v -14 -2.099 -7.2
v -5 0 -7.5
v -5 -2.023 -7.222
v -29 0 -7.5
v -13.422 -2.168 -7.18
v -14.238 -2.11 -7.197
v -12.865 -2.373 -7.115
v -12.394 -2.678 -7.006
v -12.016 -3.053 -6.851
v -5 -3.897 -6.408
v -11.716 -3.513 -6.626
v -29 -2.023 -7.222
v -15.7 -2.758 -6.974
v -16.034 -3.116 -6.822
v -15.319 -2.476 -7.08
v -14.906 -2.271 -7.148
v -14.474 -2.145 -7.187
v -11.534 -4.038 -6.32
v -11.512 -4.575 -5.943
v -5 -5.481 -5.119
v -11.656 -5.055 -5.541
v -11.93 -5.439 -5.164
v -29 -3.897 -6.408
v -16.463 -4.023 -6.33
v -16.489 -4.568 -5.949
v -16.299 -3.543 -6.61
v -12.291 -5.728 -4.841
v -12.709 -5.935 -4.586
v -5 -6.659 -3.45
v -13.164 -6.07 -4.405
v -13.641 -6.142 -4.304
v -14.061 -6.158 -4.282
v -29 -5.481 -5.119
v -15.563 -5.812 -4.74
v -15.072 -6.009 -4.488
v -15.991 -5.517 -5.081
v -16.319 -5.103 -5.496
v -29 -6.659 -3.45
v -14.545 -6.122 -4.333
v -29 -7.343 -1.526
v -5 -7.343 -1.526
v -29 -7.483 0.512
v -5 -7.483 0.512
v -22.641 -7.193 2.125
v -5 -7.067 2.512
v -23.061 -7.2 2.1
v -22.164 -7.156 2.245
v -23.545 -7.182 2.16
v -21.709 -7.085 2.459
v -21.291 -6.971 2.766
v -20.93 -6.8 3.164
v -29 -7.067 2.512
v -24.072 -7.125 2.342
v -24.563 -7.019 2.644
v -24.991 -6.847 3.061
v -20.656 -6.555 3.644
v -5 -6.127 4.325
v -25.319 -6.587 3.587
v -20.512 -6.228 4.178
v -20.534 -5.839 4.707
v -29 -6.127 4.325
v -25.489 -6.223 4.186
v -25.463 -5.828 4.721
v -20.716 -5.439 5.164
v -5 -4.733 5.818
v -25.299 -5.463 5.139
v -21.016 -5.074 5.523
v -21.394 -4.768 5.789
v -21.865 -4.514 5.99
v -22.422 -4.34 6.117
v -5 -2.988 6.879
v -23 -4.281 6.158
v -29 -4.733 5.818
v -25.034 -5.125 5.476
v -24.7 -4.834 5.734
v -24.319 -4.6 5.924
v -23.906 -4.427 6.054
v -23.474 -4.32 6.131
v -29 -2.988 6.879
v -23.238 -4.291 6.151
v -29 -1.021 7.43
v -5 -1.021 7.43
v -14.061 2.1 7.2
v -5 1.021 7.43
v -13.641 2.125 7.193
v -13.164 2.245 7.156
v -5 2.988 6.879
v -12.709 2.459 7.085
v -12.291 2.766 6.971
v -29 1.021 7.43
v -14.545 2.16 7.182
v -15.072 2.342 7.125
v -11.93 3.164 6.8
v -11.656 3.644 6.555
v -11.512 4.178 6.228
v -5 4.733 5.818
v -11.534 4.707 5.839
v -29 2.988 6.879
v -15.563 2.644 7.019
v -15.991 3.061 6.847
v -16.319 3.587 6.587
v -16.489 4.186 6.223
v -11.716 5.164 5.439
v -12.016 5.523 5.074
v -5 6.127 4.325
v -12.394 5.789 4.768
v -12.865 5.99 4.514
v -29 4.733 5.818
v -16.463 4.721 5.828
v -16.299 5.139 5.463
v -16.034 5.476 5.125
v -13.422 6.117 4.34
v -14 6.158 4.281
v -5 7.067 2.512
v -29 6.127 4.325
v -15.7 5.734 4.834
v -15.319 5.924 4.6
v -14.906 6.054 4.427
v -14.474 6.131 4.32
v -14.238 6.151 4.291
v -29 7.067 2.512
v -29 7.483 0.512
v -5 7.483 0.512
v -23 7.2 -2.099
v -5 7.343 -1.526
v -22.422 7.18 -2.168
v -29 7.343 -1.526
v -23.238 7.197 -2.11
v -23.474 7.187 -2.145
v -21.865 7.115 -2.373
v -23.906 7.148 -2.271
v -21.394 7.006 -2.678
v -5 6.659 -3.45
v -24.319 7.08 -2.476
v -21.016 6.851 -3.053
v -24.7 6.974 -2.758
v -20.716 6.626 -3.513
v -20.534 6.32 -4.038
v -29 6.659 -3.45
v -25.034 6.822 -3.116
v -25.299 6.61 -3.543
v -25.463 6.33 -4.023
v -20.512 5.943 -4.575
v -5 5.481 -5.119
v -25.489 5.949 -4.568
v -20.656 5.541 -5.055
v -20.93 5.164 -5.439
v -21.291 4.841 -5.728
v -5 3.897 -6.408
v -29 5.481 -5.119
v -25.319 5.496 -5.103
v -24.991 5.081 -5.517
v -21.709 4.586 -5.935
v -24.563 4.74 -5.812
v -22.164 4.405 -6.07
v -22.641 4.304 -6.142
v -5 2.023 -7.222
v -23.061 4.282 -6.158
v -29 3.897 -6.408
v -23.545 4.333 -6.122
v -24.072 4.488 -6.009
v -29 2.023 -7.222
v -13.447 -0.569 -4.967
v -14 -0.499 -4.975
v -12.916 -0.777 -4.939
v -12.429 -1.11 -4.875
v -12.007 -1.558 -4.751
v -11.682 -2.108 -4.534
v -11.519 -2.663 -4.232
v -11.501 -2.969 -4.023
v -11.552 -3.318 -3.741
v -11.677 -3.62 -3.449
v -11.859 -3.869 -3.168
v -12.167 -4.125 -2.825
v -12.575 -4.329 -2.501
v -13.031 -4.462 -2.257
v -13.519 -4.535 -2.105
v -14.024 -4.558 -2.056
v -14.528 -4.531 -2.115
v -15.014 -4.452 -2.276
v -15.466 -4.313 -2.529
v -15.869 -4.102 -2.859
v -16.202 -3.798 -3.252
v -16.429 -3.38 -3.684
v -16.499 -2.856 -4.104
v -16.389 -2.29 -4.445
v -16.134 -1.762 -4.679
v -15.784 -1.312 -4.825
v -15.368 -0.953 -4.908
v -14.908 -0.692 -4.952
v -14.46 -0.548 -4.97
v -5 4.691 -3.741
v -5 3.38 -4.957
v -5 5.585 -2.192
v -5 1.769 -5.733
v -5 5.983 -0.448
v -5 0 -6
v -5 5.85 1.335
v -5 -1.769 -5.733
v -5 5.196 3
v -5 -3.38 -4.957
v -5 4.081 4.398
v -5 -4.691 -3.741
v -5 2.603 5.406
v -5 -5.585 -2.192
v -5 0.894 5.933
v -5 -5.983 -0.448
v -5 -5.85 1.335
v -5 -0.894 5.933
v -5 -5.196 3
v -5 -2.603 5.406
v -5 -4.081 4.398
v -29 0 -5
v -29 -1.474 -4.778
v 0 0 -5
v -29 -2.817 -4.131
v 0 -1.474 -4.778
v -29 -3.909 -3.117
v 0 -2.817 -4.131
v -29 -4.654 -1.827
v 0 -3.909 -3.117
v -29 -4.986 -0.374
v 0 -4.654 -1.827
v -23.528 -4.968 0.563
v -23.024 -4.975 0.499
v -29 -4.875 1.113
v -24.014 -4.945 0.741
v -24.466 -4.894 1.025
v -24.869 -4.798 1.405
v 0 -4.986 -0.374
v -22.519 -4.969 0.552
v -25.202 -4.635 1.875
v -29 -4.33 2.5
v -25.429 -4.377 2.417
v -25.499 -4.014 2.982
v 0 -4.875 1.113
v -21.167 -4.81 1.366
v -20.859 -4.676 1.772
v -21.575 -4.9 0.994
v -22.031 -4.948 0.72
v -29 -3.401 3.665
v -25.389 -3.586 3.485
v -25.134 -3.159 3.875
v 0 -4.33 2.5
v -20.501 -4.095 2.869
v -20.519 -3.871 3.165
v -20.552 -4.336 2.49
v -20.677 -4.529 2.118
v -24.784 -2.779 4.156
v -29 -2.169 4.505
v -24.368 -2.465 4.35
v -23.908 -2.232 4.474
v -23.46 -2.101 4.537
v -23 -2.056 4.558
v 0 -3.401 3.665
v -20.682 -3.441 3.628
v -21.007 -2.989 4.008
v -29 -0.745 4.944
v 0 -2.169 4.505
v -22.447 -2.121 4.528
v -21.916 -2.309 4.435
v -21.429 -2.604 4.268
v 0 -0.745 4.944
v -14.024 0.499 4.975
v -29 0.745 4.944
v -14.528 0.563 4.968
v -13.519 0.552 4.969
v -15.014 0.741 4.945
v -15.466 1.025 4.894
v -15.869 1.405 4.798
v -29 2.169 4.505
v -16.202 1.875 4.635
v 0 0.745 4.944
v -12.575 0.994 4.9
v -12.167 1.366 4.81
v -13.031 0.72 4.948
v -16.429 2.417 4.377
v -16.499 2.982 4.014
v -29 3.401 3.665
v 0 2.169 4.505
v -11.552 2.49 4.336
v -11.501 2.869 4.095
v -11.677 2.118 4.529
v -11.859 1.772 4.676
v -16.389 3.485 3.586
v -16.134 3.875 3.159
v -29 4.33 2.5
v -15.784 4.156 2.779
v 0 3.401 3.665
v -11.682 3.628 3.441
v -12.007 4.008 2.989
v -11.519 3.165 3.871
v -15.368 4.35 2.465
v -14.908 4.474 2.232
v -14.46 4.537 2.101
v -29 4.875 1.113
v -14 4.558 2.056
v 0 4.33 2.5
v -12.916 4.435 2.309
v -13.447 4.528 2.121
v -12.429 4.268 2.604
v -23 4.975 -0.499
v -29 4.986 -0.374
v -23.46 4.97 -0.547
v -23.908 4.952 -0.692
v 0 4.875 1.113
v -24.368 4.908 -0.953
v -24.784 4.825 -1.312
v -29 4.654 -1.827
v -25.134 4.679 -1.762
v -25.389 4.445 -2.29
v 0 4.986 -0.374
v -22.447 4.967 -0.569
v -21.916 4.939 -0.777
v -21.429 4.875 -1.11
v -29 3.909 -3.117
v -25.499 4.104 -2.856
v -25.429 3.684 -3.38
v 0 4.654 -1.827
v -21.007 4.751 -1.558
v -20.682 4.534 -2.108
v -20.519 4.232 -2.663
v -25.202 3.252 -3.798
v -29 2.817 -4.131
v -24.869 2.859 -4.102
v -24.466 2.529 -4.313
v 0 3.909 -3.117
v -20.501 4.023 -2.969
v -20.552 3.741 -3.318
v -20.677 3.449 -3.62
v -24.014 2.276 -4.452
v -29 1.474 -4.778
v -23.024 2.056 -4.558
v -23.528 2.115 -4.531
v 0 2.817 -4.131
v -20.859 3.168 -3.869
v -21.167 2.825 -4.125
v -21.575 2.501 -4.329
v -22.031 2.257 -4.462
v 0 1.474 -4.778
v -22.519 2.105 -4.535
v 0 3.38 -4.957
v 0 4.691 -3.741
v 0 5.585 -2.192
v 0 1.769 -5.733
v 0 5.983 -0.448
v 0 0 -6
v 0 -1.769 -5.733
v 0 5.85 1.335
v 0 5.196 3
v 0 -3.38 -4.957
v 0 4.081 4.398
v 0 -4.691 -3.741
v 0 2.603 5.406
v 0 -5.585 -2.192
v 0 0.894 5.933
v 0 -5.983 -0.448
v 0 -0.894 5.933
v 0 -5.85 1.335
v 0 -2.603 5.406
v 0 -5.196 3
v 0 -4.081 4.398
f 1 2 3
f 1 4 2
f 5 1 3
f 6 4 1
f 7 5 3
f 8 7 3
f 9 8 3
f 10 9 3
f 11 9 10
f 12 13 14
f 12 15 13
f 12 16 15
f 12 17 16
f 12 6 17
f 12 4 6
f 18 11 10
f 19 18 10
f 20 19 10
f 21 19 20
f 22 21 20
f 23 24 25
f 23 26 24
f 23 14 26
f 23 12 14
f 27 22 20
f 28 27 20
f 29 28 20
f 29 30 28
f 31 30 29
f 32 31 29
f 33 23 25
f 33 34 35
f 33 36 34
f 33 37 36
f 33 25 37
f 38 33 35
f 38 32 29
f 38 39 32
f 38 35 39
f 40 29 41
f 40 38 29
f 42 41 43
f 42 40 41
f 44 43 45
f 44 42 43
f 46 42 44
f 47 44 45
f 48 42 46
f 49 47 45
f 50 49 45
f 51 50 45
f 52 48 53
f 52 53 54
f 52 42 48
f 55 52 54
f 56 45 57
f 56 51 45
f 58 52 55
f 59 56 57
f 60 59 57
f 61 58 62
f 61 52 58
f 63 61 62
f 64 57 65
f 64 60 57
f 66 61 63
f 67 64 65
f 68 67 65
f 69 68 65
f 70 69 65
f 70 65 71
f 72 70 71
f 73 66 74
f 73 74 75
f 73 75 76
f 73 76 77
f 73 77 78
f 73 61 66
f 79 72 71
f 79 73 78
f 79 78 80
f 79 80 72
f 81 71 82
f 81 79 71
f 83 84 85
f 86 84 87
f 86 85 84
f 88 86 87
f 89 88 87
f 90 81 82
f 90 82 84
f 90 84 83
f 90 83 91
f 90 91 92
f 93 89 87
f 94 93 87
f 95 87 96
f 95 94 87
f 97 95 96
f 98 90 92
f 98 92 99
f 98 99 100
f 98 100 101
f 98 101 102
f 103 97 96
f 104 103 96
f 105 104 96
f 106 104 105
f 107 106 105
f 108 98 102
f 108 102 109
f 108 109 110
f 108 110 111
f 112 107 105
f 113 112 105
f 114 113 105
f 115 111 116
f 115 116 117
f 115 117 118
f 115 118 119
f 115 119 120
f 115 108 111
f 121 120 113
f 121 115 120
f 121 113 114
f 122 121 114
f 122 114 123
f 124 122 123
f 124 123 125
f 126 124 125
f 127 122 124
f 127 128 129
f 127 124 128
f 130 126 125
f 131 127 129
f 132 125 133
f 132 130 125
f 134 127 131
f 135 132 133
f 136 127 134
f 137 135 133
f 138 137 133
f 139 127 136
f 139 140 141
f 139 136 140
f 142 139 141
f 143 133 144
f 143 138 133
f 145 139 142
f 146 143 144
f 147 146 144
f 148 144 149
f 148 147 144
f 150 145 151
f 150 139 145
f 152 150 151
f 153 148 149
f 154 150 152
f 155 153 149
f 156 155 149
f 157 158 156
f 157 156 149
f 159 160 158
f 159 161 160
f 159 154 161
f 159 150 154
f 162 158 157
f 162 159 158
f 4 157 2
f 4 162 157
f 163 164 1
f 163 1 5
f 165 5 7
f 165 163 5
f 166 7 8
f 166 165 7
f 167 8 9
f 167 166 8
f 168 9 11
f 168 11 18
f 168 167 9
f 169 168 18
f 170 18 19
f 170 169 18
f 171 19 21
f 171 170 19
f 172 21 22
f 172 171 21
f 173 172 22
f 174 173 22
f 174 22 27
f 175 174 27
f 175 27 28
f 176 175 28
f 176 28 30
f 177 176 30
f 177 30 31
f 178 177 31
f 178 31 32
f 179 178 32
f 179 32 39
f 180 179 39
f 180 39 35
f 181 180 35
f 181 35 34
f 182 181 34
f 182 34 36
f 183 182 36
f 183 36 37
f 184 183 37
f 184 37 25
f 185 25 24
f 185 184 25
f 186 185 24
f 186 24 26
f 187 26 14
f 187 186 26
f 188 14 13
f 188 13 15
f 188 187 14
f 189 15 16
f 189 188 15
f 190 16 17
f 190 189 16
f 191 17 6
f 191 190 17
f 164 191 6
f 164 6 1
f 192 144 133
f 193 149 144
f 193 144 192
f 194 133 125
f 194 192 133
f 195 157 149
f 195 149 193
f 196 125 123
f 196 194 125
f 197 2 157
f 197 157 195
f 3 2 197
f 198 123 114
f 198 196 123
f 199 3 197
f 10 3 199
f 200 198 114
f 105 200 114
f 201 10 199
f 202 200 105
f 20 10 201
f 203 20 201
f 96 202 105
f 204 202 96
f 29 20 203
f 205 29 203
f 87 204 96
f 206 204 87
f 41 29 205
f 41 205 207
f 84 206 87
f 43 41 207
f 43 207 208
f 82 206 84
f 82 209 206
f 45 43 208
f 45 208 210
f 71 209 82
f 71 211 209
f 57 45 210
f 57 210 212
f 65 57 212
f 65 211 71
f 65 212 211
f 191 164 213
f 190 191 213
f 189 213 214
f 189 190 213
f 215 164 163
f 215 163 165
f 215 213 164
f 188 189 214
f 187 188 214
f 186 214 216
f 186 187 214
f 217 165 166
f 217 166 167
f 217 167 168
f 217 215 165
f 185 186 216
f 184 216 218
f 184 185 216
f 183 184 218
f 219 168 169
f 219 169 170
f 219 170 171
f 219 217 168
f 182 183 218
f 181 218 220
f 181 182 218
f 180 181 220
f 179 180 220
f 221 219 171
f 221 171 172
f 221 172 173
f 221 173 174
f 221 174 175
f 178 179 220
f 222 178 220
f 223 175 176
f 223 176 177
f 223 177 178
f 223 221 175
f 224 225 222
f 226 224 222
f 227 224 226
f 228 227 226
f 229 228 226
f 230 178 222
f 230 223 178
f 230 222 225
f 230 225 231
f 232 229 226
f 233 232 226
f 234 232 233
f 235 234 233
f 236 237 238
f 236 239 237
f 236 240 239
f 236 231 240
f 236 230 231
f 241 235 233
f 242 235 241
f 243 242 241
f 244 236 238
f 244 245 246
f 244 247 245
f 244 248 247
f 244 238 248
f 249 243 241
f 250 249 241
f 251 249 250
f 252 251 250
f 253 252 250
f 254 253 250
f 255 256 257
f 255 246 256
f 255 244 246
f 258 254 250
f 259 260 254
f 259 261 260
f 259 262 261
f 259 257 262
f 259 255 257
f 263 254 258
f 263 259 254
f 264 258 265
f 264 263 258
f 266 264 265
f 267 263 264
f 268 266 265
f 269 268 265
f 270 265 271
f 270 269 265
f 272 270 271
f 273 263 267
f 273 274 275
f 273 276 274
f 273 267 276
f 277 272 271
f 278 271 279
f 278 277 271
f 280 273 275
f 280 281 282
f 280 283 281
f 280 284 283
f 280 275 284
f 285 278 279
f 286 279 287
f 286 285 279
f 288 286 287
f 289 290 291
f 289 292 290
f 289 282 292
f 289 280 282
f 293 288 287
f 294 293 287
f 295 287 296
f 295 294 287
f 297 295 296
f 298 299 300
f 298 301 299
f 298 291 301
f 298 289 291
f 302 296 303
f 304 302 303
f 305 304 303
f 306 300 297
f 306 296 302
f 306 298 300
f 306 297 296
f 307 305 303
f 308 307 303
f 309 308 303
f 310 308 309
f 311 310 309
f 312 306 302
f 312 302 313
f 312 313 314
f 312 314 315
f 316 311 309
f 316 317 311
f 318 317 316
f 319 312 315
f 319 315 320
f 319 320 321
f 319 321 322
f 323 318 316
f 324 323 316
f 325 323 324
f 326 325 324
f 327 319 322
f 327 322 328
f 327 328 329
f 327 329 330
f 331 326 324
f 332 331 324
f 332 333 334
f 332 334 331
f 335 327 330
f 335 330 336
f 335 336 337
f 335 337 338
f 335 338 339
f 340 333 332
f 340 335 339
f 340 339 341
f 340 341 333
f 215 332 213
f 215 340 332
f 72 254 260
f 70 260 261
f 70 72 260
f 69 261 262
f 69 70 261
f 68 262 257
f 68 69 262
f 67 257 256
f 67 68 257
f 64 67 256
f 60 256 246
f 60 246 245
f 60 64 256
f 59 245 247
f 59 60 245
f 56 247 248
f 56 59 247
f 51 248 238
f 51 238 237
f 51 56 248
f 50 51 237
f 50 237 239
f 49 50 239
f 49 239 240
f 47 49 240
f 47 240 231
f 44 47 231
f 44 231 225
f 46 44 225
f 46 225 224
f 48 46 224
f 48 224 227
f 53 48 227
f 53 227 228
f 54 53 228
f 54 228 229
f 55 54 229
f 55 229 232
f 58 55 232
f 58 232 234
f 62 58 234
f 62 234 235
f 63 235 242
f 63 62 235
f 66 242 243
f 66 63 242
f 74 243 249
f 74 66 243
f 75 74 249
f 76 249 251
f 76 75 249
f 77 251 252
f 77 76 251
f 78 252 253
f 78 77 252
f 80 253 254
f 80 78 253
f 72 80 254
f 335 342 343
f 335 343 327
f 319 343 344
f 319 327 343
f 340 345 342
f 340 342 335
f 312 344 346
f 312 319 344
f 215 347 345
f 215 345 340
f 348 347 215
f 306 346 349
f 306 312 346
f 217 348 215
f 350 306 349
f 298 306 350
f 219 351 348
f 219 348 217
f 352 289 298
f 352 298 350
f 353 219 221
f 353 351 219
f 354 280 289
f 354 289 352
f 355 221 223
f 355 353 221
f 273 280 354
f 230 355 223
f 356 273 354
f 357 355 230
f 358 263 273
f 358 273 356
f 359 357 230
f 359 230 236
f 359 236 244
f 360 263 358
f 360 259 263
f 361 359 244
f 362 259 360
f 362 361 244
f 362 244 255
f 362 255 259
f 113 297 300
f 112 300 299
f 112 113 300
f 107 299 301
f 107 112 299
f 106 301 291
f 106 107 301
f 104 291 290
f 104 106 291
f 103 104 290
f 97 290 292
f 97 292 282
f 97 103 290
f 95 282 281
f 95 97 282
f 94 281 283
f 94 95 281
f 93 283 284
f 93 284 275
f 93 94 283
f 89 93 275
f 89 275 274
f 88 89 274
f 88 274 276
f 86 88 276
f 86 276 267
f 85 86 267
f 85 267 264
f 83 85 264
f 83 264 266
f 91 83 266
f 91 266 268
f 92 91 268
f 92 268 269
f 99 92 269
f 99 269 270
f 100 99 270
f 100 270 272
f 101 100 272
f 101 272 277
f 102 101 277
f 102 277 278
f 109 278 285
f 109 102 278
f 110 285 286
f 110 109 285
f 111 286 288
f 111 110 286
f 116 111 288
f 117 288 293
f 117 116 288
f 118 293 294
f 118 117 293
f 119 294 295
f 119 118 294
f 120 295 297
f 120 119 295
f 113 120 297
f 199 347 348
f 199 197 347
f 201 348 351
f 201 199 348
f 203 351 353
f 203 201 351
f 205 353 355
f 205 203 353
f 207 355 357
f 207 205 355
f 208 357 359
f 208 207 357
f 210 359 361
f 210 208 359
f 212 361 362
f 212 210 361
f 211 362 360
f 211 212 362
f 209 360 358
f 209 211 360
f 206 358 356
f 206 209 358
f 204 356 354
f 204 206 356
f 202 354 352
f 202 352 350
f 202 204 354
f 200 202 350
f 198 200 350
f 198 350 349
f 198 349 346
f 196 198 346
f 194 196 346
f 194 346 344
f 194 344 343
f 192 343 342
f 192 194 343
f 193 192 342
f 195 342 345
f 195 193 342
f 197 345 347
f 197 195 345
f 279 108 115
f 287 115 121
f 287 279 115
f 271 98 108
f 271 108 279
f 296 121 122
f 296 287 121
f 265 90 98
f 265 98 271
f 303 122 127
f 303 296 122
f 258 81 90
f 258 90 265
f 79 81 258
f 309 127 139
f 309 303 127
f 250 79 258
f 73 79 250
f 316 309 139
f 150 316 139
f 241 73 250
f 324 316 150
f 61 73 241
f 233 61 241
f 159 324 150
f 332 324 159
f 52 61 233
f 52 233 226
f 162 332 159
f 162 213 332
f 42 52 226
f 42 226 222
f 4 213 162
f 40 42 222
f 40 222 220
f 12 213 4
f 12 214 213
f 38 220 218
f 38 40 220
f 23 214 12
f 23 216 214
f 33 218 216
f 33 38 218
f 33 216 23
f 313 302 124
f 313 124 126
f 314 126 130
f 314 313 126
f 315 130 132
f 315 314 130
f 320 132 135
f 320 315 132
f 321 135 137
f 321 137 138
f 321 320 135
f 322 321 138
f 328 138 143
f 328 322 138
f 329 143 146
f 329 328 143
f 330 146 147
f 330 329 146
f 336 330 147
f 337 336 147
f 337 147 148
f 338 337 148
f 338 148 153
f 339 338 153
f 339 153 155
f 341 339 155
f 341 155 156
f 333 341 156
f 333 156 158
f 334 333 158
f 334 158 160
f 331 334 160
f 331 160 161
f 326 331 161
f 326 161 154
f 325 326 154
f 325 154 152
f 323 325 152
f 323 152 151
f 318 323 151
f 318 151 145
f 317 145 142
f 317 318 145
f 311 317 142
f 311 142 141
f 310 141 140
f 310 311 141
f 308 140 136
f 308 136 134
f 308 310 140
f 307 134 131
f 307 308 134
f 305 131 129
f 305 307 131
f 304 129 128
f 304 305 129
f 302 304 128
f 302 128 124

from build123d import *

# Parameters (mm, degrees)
CUT_EXTRUDE1_DEPTH      = 195.978637362
CUT_EXTRUDE1_DEPTH_BACK = 195.978637362
SKETCH4_R               = 2.5
CUT_EXTRUDE2_DEPTH      = 151.611328634
CUT_EXTRUDE2_DEPTH_BACK = 151.611328634
SKETCH3_R               = 2.5


with BuildPart() as part:
    # Sketch2 → Revolve1 (revolve)
    with BuildSketch(Plane.XY, mode=Mode.PRIVATE) as revolve1_sk:
        Polygon((0, 6), (-5, 6), (-5, 7.5), (-29, 7.5), (-29, 5), (0, 5), align=None)
    revolve(revolve1_sk.sketch.rotate(Axis((0, 0, 0), (-1, 0, 0)), 90), axis=Axis((0, 0, 0), (-1, 0, 0)))

    # Sketch4 → Cut-Extrude1 (cut, two sides: drawn at the far end of the back side and taken through both)
    with BuildSketch(Plane(origin=(-120.750059673, 87.243462265, 112.748777435), x_dir=(0.8561890359823346, 0.3016571585603837, 0.41945594924010343), z_dir=(0, 0.8118564738851006, -0.5838570593996881)).offset(-CUT_EXTRUDE1_DEPTH_BACK)):
        with Locations(Location((10.081768965, 172.488088347, 0), (0, 0, 301.108656356))):
            Circle(SKETCH4_R)
    extrude(amount=CUT_EXTRUDE1_DEPTH + CUT_EXTRUDE1_DEPTH_BACK, mode=Mode.SUBTRACT)

    # Sketch3 → Cut-Extrude2 (cut, two sides: drawn at the far end of the back side and taken through both)
    with BuildSketch(Plane(origin=(-120.750059673, -67.453558659, 42.35137307), x_dir=(-0.5093963915480642, 0.6986284720029967, -0.5024276807507421), z_dir=(0, -0.5838570593996879, -0.8118564738851008)).offset(-CUT_EXTRUDE2_DEPTH_BACK)):
        with Locations(Location((14.02538357, 132.353637021, 0), (0, 0, 30.623632048))):
            Circle(SKETCH3_R)
    extrude(amount=CUT_EXTRUDE2_DEPTH + CUT_EXTRUDE2_DEPTH_BACK, mode=Mode.SUBTRACT)


solid = part.part
